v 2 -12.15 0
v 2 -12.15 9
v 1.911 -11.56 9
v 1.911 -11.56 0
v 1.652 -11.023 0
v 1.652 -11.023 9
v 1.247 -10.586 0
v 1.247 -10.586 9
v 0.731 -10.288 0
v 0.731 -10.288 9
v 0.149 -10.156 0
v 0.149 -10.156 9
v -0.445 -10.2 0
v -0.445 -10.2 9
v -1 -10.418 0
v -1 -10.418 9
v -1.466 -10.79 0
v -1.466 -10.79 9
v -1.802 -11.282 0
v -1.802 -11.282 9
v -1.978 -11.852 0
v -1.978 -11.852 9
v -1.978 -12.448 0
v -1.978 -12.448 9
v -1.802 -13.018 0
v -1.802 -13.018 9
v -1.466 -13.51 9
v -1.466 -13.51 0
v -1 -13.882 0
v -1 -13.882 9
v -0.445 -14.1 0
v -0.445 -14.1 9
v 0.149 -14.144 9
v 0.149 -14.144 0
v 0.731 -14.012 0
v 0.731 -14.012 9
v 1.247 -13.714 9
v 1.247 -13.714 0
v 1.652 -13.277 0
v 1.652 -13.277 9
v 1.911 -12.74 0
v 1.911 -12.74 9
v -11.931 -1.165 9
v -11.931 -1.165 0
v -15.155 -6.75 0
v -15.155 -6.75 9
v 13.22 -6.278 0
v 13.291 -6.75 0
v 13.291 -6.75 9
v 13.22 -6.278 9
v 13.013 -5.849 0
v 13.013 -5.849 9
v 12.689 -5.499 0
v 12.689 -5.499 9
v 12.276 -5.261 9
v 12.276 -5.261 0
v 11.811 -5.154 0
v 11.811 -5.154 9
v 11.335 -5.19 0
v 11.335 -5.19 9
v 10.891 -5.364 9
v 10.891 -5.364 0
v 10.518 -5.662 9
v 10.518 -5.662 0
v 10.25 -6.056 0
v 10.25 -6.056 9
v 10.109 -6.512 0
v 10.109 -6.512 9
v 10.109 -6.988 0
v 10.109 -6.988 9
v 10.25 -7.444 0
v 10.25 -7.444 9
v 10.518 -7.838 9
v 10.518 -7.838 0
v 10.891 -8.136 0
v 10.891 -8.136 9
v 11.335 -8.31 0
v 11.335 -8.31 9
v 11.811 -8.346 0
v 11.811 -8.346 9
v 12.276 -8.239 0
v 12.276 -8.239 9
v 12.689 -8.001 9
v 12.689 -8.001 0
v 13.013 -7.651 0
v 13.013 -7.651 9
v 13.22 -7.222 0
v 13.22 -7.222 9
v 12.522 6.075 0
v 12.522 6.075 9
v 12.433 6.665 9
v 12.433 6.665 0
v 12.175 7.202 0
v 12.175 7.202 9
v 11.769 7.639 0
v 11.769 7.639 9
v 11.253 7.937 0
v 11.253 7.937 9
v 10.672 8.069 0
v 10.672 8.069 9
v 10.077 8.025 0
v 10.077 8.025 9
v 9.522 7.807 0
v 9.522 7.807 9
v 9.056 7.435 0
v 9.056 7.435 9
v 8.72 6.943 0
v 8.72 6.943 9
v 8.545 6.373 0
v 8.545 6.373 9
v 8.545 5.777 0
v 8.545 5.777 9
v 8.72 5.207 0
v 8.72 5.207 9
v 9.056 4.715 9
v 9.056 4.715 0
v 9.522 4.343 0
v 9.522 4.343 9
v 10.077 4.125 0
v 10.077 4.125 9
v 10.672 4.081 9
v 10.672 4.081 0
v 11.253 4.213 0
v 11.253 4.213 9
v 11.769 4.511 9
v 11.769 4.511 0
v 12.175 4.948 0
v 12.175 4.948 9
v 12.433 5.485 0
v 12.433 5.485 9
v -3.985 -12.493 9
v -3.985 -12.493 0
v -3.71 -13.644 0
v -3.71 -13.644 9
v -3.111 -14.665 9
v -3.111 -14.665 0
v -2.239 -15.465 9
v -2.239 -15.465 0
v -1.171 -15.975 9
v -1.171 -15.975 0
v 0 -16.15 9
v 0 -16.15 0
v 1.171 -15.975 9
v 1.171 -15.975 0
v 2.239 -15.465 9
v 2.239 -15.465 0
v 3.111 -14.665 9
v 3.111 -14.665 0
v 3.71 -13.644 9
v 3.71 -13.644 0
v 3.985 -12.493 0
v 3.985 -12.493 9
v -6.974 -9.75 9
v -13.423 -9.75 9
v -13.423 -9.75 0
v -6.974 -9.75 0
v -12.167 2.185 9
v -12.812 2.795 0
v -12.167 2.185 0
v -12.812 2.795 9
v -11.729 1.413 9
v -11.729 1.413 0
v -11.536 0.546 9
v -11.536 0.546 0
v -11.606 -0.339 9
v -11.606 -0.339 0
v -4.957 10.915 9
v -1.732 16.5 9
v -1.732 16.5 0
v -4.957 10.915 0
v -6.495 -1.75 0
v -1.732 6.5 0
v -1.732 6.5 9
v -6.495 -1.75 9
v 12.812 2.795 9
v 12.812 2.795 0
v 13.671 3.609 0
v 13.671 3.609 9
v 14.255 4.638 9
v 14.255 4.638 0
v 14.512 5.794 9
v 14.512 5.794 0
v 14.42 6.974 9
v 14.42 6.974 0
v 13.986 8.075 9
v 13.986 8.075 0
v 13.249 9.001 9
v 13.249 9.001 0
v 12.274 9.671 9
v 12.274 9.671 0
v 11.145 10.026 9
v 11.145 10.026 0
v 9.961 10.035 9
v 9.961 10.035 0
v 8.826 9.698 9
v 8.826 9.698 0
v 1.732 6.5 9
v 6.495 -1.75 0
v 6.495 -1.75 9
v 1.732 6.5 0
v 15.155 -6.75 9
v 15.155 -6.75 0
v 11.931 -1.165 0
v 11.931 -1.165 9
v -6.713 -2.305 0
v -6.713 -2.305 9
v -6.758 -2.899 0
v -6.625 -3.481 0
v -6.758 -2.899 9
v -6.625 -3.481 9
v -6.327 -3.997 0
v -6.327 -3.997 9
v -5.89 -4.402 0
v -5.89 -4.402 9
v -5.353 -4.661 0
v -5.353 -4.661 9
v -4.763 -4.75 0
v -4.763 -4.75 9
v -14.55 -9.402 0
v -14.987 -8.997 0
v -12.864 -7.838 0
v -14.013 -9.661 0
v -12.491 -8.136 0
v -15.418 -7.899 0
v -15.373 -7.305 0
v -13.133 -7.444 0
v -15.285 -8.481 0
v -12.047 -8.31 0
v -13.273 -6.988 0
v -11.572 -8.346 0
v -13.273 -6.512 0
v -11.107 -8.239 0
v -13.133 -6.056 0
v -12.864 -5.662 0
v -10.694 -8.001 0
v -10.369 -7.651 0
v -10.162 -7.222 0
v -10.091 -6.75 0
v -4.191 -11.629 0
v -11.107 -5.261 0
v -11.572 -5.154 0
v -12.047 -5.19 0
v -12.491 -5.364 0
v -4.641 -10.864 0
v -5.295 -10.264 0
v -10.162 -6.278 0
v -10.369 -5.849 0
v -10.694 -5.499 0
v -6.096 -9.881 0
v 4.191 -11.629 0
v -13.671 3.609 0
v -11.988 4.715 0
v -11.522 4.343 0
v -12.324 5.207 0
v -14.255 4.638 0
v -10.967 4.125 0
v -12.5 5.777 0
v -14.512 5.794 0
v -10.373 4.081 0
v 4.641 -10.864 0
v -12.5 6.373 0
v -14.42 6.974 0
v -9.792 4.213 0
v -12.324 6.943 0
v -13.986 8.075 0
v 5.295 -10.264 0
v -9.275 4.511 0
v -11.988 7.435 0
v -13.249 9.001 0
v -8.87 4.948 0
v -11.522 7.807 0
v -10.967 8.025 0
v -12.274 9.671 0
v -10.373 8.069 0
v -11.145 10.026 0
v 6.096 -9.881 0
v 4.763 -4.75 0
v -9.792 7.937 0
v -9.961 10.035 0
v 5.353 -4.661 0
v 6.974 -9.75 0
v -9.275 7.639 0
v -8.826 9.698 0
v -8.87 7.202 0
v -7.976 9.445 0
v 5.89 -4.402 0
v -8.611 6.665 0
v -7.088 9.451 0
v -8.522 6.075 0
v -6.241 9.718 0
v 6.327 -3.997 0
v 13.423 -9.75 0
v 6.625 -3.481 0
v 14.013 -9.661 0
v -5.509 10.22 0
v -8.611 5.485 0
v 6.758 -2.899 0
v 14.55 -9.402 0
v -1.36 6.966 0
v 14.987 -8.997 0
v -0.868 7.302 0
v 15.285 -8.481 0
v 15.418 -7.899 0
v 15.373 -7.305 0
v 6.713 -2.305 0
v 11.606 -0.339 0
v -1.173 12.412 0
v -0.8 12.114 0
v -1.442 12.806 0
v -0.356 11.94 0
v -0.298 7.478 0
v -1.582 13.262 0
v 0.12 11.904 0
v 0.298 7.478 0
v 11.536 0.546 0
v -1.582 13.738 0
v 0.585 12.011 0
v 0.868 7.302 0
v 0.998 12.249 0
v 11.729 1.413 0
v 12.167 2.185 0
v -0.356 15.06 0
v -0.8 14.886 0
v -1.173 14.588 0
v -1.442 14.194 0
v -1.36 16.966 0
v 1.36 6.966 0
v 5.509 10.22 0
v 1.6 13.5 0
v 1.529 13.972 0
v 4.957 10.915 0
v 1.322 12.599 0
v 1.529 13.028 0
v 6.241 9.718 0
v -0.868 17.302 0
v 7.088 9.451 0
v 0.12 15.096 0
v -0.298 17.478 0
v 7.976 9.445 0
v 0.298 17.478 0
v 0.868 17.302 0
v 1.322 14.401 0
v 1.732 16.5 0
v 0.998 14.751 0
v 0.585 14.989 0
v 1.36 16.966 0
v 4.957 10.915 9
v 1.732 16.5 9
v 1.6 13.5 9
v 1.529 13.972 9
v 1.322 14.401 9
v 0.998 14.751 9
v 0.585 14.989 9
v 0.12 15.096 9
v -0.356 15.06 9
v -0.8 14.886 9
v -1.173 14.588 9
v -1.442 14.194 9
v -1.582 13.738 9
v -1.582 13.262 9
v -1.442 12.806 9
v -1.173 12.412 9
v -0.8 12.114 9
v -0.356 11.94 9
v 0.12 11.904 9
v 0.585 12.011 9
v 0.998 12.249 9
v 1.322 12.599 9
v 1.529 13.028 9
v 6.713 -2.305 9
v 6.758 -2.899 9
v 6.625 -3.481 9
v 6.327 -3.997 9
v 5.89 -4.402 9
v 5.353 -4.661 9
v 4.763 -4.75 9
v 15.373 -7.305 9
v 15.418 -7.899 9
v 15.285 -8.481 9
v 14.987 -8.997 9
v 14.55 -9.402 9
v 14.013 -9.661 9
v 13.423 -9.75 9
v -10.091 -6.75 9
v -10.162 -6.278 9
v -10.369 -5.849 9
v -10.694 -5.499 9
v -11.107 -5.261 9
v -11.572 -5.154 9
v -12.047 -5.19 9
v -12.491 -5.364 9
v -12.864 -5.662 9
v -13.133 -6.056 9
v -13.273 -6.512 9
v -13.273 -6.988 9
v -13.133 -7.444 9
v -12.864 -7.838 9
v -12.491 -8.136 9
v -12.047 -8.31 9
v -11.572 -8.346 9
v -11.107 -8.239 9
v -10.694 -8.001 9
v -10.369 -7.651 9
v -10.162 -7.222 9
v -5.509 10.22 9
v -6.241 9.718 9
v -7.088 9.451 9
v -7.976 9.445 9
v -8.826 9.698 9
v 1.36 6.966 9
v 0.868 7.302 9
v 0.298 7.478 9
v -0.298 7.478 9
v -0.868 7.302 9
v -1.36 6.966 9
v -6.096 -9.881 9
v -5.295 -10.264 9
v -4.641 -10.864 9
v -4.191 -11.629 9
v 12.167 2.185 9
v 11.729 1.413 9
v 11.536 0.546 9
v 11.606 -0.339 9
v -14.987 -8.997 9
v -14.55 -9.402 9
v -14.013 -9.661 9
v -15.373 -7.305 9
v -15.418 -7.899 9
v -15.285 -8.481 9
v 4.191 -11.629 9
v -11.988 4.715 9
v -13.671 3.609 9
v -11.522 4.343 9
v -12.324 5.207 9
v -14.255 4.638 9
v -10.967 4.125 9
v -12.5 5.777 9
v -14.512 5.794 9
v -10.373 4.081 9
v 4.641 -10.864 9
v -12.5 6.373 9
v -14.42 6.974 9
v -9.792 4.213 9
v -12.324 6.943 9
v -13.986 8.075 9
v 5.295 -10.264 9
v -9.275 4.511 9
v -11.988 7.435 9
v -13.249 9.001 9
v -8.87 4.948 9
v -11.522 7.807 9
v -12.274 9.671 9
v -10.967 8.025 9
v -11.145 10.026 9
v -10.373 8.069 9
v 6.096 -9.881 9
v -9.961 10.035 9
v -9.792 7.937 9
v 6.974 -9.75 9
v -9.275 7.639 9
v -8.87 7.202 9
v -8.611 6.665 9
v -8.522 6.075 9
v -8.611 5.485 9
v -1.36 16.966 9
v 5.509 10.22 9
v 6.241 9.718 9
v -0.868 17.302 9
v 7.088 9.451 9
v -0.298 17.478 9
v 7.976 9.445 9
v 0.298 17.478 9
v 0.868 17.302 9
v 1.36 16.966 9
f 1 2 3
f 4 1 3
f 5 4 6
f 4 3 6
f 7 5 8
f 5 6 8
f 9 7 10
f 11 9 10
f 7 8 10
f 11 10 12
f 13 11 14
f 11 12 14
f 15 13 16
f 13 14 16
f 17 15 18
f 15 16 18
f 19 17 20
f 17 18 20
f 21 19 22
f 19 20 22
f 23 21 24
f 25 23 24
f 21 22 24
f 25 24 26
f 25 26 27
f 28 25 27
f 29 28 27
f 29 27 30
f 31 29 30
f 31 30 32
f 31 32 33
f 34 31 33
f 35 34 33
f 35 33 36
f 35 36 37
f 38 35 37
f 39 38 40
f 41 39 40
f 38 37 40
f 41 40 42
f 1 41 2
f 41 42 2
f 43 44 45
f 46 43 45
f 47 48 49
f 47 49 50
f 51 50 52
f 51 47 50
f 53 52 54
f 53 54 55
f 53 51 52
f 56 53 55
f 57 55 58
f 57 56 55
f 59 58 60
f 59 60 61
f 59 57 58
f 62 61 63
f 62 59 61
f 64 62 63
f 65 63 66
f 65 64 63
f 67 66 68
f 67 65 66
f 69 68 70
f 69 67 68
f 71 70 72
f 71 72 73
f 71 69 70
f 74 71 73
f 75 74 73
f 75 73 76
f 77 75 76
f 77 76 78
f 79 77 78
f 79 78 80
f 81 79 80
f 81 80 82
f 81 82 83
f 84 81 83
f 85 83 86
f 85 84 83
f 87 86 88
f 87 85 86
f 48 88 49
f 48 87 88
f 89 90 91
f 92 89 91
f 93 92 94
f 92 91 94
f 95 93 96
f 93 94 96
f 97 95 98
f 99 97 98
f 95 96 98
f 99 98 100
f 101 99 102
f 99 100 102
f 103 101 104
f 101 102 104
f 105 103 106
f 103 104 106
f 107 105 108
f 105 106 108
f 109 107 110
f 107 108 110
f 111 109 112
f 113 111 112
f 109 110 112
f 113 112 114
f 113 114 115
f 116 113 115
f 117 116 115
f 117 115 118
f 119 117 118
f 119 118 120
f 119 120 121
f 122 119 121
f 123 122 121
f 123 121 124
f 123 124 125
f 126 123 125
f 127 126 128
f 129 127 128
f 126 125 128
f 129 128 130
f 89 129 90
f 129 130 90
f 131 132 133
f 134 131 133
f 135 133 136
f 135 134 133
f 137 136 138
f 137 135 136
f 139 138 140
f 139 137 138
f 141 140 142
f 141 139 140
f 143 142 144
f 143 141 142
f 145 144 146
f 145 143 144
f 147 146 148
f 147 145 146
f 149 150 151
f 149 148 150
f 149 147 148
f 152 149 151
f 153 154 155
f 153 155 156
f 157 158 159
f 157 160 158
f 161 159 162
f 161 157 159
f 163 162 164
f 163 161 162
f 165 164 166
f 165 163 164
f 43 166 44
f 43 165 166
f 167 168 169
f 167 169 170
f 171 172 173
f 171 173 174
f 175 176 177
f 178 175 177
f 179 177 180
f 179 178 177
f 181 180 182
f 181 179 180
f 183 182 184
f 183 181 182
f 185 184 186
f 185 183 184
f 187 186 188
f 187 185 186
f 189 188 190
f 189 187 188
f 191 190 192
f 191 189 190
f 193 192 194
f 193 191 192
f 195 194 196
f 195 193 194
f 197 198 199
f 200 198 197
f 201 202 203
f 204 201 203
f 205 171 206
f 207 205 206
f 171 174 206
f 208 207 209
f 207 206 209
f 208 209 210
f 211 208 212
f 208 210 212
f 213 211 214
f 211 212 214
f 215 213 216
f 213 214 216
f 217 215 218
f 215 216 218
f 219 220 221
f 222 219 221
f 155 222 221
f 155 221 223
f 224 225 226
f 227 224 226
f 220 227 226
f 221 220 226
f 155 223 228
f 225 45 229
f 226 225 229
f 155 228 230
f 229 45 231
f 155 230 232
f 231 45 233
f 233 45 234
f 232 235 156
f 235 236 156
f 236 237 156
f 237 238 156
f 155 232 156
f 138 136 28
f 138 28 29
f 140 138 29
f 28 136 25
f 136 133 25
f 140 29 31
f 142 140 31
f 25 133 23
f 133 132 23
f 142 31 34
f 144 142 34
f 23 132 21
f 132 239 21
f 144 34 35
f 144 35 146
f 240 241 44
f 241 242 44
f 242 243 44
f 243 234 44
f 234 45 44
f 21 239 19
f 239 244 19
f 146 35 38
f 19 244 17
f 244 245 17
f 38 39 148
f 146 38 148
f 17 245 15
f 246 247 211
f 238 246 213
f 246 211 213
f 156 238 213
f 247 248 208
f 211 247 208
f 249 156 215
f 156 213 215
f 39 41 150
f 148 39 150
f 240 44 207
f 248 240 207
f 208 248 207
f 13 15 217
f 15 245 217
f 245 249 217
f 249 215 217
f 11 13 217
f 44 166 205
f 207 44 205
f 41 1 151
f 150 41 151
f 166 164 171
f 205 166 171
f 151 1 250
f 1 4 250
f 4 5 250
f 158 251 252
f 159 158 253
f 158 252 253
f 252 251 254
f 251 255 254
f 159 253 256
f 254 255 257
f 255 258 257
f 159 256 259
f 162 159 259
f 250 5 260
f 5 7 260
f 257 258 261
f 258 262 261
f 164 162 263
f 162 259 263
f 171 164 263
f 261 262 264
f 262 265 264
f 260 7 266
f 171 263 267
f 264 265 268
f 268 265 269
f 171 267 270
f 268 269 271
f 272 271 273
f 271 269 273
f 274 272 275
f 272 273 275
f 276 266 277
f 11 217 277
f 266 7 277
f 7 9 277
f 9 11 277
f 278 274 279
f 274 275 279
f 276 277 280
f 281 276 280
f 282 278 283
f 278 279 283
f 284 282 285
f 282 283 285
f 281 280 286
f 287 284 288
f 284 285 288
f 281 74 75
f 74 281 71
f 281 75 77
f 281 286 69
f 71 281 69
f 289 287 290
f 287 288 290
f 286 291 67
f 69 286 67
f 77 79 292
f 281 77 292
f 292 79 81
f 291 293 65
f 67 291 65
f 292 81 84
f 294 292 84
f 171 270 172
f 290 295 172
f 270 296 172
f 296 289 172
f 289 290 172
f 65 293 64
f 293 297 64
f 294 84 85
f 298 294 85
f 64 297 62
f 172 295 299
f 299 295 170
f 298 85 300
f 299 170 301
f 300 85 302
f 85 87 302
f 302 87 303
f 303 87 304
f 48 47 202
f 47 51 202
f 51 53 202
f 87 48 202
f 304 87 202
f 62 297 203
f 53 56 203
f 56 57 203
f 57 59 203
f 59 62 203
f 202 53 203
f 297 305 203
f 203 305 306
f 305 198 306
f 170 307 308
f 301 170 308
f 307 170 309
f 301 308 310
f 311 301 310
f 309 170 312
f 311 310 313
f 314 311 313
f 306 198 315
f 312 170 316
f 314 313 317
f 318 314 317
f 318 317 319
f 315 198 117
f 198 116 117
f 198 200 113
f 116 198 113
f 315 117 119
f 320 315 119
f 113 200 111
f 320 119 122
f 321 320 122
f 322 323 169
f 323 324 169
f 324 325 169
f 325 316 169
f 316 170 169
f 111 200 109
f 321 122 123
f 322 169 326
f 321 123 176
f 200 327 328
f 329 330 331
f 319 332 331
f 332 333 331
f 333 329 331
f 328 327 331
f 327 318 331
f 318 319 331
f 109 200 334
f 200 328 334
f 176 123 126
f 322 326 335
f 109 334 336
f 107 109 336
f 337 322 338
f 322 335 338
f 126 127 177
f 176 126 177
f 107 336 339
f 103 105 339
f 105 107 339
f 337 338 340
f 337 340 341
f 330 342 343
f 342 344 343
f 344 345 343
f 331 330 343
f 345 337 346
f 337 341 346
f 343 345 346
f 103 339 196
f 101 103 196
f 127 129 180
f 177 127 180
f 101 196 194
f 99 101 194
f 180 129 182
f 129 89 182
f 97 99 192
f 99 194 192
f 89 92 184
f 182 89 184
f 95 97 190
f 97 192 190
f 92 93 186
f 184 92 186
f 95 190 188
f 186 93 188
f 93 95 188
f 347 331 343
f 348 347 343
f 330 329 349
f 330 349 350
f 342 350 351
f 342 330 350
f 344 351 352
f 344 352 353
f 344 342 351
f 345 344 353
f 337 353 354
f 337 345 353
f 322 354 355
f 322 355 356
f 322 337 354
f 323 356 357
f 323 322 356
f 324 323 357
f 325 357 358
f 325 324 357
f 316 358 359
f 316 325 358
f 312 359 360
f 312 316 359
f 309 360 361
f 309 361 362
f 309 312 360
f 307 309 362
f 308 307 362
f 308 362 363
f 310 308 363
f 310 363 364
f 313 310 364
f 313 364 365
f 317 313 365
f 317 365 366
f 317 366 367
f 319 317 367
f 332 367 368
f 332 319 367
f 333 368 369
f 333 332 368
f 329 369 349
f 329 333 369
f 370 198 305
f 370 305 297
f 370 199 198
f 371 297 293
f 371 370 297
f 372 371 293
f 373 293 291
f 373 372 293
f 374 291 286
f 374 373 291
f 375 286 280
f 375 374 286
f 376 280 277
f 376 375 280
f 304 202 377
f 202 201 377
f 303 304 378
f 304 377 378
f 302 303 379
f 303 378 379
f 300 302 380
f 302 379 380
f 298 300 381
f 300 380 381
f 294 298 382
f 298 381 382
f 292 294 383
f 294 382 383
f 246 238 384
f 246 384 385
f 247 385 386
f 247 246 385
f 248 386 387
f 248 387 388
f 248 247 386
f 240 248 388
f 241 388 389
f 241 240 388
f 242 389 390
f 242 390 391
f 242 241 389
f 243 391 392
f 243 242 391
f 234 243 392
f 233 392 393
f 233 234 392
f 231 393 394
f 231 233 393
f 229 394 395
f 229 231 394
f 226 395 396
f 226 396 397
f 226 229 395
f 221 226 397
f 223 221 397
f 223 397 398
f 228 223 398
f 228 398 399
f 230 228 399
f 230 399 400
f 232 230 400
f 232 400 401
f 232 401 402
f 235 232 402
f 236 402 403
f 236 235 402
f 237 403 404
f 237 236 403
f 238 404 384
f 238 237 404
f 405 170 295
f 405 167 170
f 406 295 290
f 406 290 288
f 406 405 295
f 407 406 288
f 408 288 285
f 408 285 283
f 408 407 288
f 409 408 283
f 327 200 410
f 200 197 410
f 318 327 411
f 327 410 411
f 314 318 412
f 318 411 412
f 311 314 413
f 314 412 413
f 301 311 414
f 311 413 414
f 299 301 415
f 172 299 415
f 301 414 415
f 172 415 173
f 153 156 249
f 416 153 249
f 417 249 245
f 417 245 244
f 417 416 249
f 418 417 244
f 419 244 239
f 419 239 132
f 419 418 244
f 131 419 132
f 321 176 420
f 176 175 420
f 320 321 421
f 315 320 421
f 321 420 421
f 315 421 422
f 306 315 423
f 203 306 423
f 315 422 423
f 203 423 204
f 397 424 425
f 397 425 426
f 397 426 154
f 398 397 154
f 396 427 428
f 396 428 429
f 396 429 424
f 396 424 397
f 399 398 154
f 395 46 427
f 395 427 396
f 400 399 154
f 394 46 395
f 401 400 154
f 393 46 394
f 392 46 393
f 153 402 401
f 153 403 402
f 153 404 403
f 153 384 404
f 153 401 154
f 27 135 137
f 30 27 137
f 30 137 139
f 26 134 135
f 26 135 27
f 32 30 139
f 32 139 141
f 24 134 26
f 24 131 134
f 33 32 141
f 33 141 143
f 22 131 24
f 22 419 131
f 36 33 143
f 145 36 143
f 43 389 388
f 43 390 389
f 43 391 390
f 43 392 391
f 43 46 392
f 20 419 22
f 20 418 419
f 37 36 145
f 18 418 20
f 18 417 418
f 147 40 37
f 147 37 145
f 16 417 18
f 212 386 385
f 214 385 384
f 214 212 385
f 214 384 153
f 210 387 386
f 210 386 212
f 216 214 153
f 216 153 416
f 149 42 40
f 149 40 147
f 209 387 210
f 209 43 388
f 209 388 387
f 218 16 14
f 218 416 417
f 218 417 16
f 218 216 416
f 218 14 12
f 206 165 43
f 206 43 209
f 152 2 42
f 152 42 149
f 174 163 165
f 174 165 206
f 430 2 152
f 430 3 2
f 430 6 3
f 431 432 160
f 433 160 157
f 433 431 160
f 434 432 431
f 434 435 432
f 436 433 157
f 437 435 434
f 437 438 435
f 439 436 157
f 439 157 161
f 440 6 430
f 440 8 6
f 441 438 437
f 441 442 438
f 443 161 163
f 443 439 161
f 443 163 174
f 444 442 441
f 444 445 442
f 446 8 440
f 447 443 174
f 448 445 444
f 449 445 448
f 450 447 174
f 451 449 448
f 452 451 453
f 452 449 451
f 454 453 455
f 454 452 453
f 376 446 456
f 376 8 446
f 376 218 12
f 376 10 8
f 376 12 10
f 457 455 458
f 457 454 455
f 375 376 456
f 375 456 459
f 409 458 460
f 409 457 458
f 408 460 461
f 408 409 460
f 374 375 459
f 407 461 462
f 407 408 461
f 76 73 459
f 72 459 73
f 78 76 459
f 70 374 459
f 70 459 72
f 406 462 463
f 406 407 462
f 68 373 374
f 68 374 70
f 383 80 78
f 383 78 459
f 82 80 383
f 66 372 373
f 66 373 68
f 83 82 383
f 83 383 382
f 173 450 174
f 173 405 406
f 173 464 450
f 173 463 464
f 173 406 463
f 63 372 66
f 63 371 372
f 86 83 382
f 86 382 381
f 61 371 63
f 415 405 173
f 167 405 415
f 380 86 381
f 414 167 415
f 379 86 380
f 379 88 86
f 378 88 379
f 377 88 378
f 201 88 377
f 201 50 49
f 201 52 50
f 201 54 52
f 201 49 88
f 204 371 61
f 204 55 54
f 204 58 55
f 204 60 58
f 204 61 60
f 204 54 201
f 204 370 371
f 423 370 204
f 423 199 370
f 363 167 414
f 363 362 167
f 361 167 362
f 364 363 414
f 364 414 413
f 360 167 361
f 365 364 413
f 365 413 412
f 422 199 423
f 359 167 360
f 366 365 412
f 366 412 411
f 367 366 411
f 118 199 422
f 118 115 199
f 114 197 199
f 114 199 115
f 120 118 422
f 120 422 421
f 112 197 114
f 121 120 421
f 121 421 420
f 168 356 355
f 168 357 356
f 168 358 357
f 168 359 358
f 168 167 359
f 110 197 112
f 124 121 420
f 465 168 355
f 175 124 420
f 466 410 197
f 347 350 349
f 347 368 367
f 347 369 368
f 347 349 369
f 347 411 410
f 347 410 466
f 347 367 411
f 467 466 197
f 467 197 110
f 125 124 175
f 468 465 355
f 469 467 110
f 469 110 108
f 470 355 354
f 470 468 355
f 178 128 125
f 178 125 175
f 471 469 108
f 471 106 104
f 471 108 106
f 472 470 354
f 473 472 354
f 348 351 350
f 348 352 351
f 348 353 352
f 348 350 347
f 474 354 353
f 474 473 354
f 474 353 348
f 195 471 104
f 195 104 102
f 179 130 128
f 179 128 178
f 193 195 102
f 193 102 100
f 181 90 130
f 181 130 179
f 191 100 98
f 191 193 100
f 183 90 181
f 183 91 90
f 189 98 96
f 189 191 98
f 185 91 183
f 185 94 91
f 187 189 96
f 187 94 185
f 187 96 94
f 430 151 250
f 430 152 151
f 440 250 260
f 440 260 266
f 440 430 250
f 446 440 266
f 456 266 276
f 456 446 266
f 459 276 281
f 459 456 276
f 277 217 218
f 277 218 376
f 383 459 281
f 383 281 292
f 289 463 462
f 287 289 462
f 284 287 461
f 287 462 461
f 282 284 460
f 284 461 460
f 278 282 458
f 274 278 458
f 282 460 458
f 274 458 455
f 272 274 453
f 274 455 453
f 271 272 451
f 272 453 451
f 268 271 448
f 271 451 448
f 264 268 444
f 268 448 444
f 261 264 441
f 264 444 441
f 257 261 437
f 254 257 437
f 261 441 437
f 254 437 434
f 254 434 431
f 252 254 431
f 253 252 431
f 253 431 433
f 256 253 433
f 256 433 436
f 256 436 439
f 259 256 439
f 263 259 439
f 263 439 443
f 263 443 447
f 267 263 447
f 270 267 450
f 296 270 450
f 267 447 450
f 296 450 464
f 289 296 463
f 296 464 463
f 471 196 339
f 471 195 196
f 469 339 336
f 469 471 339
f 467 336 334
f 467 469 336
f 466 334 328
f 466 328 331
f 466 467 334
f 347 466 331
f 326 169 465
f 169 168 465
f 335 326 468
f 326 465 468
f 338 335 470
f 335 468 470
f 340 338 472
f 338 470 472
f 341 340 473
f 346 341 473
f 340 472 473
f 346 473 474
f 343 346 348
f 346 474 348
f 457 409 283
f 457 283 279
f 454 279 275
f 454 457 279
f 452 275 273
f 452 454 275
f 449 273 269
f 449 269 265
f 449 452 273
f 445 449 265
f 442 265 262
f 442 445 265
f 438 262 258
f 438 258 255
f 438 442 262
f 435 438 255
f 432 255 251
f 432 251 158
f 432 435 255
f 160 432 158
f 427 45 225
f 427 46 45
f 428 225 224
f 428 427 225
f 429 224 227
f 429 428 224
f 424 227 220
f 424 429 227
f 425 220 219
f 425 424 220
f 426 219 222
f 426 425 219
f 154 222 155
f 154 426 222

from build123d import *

# Parameters (mm, degrees)
SKETCH_1_R      = 1.6
EXTRUDE_1_DEPTH = 9
FILLET_1_R      = 2
SKETCH_2_R      = 4
SKETCH_2_R_2    = 2
EXTRUDE_2_DEPTH = 9
FILLET_2_R      = 3


with BuildPart() as part:
    # 草图1 → 凸台-拉伸1 (new body)
    with BuildSketch(Plane.XY):
        Polygon((0, 19.5), (-16.887495374, -9.75), (16.887495374, -9.75), align=None)
        with Locations((0, 13.5)):
            Circle(SKETCH_1_R, mode=Mode.SUBTRACT)
        with Locations((11.691342951, -6.75)):
            Circle(SKETCH_1_R, mode=Mode.SUBTRACT)
        with Locations((-11.691342951, -6.75)):
            Circle(SKETCH_1_R, mode=Mode.SUBTRACT)
        Polygon((8.227241336, -4.75), (0, 9.5), (-8.227241336, -4.75), align=None, mode=Mode.SUBTRACT)
    extrude(amount=EXTRUDE_1_DEPTH)

    # 圆角1
    fillet_1_edges = [part.edges().sort_by_distance(p)[0] for p in [
        (-8.227241336, -4.75, 4.5),
        (8.227241336, -4.75, 4.5),
        (0, 9.5, 4.5),
        (16.887495374, -9.75, 4.5),
        (-16.887495374, -9.75, 4.5),
        (0, 19.5, 4.5),
    ]]
    fillet(fillet_1_edges, radius=FILLET_1_R)

    # 草图2 → 凸台-拉伸2 (add)
    # profile 1 of 3: a face of its own
    with BuildSketch(Plane.XY.offset(9)):
        with Locations((10.522208656, 6.075)):
            Circle(SKETCH_2_R)
        with Locations((10.522208656, 6.075)):
            Circle(SKETCH_2_R_2, mode=Mode.SUBTRACT)
    # profile 2 of 3: a face of its own
    with BuildSketch(Plane.XY.offset(9)):
        with Locations((-10.522208656, 6.075)):
            Circle(SKETCH_2_R)
        with Locations((-10.522208656, 6.075)):
            Circle(SKETCH_2_R_2, mode=Mode.SUBTRACT)
    # profile 3 of 3: a face of its own
    with BuildSketch(Plane.XY.offset(9)):
        with Locations((0, -12.15)):
            Circle(SKETCH_2_R)
        with Locations((0, -12.15)):
            Circle(SKETCH_2_R_2, mode=Mode.SUBTRACT)
    extrude(amount=-EXTRUDE_2_DEPTH)

    # 圆角2
    fillet_2_edges = [part.edges().sort_by_distance(p)[0] for p in [
        (3.2, -9.75, 4.5),
        (-3.2, -9.75, 4.5),
        (6.843747687, 7.646281292, 4.5),
        (10.043747687, 2.103718708, 4.5),
        (-10.043747687, 2.103718708, 4.5),
        (-6.843747687, 7.646281292, 4.5),
    ]]
    fillet(fillet_2_edges, radius=FILLET_2_R)


solid = part.part
